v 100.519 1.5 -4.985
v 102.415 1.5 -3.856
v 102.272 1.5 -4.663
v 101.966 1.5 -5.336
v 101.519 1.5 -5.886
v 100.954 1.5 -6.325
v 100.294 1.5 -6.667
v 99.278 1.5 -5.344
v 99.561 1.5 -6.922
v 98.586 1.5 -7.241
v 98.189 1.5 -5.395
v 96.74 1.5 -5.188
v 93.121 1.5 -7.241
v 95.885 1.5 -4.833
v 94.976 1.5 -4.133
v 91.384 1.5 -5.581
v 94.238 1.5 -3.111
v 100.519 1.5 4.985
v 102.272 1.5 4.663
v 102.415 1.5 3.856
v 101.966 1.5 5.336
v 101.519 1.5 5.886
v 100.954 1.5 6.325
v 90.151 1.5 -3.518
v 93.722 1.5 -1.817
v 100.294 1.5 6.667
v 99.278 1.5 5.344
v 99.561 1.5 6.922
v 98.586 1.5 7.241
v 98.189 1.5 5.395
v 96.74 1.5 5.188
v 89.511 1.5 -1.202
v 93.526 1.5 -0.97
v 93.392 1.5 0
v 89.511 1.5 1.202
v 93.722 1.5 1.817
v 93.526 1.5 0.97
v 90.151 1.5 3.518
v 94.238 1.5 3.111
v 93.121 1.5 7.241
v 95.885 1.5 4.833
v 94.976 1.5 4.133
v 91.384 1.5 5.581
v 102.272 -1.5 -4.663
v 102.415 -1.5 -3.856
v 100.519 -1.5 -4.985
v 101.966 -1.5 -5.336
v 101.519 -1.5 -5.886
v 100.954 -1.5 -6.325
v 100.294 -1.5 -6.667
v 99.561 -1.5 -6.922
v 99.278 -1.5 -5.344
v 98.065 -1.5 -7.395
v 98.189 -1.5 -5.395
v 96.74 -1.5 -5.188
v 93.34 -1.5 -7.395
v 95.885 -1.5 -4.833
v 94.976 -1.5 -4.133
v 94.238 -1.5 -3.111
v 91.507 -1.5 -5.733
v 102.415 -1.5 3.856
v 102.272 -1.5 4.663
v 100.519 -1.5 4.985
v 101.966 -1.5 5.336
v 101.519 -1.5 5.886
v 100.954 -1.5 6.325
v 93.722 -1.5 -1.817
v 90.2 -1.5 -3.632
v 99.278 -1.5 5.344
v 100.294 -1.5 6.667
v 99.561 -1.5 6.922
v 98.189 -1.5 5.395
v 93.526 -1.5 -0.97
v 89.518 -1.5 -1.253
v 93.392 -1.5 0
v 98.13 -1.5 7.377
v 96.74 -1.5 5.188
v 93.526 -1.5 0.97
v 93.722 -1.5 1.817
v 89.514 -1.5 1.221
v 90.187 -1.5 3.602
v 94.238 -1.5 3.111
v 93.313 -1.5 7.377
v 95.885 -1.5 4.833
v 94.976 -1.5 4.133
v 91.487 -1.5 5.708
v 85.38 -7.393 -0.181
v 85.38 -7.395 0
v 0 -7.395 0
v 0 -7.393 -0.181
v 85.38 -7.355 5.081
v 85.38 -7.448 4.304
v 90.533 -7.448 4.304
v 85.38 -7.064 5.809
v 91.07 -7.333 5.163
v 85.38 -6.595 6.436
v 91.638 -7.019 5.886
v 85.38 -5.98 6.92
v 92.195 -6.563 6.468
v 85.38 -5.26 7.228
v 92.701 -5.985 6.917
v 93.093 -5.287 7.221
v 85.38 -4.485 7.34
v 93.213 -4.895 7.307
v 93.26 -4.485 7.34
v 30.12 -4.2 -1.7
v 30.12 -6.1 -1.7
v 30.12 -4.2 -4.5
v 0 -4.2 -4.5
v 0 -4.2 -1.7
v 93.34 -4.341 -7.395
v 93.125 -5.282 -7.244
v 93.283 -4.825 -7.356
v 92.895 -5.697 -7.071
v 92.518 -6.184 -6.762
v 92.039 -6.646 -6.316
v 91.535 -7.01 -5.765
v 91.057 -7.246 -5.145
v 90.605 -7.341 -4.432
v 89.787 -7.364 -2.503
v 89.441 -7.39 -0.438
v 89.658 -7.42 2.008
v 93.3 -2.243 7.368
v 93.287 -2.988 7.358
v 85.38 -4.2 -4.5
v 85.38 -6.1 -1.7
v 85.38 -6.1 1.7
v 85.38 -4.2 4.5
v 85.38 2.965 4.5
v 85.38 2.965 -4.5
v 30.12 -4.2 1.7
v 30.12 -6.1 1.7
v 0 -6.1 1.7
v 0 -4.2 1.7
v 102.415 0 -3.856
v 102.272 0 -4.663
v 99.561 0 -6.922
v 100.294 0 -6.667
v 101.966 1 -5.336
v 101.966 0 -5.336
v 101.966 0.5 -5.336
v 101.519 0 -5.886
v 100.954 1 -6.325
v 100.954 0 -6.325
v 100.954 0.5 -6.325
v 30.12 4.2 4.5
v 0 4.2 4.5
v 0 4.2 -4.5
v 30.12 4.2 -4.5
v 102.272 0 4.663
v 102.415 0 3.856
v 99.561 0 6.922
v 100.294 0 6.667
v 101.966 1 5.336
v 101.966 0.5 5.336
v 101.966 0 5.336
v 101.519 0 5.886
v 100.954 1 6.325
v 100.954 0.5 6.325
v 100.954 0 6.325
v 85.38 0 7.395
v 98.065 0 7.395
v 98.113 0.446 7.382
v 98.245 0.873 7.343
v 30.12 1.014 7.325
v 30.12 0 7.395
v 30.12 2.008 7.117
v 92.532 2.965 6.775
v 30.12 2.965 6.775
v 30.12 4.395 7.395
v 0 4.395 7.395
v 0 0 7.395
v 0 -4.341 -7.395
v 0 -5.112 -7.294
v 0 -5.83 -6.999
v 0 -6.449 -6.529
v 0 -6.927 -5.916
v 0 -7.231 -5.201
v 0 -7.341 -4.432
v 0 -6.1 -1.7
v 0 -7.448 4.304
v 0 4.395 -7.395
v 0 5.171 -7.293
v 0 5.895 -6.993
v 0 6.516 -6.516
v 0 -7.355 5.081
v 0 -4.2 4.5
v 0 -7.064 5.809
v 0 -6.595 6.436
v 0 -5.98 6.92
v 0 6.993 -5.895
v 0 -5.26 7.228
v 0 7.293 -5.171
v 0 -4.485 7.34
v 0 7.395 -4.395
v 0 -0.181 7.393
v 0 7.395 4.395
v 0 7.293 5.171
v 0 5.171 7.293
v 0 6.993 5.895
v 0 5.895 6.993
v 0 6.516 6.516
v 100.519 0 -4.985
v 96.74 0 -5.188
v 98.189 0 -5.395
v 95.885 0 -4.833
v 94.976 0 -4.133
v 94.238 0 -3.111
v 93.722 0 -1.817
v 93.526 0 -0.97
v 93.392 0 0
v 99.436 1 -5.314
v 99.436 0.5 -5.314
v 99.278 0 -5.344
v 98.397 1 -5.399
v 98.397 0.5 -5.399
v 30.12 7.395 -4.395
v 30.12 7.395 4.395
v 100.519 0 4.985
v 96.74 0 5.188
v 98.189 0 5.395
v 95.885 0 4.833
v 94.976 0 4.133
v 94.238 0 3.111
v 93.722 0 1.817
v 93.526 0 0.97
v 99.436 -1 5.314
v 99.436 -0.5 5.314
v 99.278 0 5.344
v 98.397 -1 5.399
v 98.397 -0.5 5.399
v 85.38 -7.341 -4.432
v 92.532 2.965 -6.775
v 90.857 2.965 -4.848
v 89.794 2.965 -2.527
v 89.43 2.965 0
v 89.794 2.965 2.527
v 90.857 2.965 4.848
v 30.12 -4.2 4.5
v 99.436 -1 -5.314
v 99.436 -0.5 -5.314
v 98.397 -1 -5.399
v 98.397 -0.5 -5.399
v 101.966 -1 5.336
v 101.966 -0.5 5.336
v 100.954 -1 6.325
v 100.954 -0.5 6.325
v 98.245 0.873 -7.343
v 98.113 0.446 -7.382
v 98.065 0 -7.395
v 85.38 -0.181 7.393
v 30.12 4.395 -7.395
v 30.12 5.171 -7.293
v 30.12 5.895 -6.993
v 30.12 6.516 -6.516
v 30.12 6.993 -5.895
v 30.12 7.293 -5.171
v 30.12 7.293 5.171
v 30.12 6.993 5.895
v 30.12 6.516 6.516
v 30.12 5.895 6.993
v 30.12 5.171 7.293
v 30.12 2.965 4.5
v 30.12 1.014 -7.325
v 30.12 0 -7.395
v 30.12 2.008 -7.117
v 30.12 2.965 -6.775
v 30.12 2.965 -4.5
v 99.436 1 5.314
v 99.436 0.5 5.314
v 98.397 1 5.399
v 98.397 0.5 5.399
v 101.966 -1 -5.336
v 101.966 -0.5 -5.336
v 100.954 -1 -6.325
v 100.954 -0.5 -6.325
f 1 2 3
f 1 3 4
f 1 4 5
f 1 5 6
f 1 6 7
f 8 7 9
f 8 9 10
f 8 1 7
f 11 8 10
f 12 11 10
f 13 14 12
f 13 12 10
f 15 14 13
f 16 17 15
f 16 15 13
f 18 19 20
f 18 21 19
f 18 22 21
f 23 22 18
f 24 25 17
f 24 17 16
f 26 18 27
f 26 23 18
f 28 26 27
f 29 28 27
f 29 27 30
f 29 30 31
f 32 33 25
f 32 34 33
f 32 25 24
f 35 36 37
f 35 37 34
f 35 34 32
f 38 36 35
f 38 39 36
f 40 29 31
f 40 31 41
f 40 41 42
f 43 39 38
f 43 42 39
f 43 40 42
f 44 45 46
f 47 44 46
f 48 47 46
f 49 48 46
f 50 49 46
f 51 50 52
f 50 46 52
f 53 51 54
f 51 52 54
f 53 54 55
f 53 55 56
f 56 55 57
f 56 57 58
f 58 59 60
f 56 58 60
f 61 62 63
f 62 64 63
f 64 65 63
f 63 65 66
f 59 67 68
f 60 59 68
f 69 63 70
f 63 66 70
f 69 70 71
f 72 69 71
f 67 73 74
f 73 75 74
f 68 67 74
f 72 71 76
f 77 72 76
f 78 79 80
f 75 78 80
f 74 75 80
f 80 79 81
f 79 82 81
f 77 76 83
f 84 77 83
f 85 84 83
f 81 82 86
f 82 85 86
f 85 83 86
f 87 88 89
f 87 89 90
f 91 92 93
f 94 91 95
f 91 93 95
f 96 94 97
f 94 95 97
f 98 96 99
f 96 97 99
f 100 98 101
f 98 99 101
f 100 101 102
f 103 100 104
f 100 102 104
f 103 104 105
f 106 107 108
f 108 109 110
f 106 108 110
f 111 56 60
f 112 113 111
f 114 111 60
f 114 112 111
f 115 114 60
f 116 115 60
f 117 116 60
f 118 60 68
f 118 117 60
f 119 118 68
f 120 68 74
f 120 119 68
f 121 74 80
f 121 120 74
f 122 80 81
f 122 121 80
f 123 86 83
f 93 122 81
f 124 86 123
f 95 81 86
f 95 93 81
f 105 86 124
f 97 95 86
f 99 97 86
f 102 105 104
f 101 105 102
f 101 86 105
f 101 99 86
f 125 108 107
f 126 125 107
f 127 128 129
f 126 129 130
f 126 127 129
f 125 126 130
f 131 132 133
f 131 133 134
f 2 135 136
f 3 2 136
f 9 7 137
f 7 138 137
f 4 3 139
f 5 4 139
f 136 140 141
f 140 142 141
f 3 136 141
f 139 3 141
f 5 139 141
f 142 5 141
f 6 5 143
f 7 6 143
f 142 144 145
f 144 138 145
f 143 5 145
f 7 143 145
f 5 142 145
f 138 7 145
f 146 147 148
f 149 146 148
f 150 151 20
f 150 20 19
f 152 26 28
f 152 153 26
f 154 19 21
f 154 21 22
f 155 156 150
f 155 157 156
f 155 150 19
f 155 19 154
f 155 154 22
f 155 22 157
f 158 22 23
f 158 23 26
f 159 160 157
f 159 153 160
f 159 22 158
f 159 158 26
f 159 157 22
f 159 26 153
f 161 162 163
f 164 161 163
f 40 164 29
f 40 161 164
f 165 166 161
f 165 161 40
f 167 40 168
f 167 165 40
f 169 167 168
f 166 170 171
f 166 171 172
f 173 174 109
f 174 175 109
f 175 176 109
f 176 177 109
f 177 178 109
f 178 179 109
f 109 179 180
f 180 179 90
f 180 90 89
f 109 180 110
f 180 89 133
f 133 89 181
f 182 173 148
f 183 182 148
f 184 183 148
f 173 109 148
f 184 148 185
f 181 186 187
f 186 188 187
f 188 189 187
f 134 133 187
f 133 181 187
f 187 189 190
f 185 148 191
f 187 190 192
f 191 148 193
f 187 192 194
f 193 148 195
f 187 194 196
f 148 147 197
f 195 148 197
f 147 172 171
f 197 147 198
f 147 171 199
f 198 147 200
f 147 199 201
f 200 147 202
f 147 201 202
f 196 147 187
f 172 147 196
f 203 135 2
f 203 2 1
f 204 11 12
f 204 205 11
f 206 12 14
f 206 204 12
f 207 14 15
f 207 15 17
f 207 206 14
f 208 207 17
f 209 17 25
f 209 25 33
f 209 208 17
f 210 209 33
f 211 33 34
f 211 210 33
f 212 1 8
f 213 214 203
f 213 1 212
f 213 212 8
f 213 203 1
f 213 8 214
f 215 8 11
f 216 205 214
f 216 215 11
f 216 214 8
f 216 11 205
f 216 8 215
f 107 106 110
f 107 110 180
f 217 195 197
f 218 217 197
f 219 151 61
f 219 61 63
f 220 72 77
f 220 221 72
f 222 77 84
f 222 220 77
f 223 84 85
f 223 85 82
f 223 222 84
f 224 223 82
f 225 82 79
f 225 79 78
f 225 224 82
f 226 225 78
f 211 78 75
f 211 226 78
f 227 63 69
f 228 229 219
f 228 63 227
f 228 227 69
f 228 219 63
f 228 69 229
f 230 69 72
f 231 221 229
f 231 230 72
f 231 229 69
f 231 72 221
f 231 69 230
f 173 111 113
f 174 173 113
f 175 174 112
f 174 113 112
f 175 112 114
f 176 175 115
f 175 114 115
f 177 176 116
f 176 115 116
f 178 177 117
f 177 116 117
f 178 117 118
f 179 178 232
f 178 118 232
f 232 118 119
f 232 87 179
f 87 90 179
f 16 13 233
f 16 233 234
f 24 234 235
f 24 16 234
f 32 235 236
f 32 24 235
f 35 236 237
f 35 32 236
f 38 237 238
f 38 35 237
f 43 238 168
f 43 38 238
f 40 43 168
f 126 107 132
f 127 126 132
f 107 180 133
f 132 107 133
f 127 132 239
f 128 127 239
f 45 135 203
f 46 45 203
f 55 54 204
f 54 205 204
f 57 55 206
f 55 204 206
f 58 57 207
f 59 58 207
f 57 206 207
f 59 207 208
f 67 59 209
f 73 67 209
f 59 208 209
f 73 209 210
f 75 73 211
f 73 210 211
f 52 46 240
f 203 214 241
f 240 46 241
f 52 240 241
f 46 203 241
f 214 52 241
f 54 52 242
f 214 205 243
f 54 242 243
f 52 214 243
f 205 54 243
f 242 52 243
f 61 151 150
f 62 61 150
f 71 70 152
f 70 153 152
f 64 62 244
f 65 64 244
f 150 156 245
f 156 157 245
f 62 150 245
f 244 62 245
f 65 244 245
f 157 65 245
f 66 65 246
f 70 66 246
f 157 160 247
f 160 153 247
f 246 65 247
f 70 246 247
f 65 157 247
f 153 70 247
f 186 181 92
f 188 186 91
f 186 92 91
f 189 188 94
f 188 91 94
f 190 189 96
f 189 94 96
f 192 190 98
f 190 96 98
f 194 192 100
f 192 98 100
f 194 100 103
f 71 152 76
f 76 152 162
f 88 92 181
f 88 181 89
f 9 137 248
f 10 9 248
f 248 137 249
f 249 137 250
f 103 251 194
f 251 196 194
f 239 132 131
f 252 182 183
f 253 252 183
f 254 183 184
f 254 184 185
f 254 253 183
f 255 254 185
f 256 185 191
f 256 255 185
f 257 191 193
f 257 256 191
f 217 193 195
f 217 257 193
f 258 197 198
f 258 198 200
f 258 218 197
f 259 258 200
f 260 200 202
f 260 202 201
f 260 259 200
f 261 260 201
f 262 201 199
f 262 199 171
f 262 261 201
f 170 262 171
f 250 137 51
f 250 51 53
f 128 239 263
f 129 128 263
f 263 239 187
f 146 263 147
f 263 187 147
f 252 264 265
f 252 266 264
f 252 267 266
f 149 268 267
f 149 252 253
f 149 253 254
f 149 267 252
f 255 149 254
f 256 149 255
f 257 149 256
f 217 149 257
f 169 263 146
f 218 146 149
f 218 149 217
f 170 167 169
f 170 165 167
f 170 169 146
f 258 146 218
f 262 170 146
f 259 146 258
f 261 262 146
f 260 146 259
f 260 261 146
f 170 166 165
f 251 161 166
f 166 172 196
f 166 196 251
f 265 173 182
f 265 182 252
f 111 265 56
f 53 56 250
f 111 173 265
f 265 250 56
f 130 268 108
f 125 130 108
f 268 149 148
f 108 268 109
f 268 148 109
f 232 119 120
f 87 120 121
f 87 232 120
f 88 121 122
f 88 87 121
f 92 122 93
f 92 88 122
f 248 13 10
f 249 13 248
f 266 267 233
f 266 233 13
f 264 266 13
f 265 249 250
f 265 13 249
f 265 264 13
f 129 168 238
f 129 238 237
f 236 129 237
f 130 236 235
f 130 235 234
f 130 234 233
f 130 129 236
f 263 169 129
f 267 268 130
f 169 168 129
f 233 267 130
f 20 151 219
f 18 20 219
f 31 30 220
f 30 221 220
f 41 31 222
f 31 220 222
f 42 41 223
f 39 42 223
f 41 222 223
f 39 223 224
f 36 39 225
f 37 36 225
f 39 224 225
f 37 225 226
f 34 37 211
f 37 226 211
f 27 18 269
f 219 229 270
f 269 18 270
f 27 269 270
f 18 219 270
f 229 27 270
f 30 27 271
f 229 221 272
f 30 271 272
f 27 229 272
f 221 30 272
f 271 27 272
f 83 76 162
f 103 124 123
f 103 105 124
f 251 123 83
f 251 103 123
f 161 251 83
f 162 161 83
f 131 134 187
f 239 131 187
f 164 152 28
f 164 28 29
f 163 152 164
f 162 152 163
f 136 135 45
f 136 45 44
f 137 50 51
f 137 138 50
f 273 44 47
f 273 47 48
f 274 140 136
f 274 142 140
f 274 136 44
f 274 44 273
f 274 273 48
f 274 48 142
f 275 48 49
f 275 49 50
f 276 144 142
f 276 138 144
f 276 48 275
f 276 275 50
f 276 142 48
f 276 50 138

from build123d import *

# Parameters (mm, degrees)
F1_DEPTH = 30.12
F3_DEPTH = 55.26
F6_DEPTH = 7.5
F8_DEPTH = 1.5
F9_DEPTH = 13.7
F10_R    = 3


with BuildPart() as f1:
    # F0 (on Right) → F1 (new body)
    with BuildSketch(Plane.YZ):
        with BuildLine():
            ThreePointArc((0, -7.395), (5.2290546469, -5.2290546469), (7.395, 0))
            ThreePointArc((7.395, 0), (5.2290546469, 5.2290546469), (0, 7.395))
            Line((0, 7.395), (-0.1808295417, 7.3927887618))
            ThreePointArc((-0.1808295417, 7.3927887618), (-5.2926014143, 5.1647260595), (-7.395, 0))
            Line((-7.395, 0), (-7.3927887618, -0.1808295417))
            ThreePointArc((-7.3927887618, -0.1808295417), (-5.1647260595, -5.2926014143), (0, -7.395))
        make_face()
        Polygon((-4.2, 1.7), (-4.2, 4.5), (4.2, 4.5), (4.2, -4.5), (-4.2, -4.5), (-4.2, -1.7), (-6.1, -1.7), (-6.1, 1.7), align=None, mode=Mode.SUBTRACT)
        with BuildLine():
            Line((-7.3045717093, -7.395), (0, -7.395))
            ThreePointArc((0, -7.395), (-5.1647260595, -5.2926014143), (-7.3927887618, -0.1808295417))
            Line((-7.3927887618, -0.1808295417), (-7.3045717093, -7.395))
        make_face()
        with BuildLine():
            ThreePointArc((-7.395, 0), (-5.2926014143, 5.1647260595), (-0.1808295417, 7.3927887618))
            Line((-0.1808295417, 7.3927887618), (-7.4843091518, 7.3034796101))
            Line((-7.4843091518, 7.3034796101), (-7.395, 0))
        make_face()
        with BuildLine():
            Line((7.395, -7.395), (7.395, 0))
            ThreePointArc((7.395, 0), (5.2290546469, -5.2290546469), (0, -7.395))
            Line((0, -7.395), (7.395, -7.395))
        make_face()
        with BuildLine():
            ThreePointArc((0, 7.395), (5.2290546469, 5.2290546469), (7.395, 0))
            Line((7.395, 0), (7.395, 7.395))
            Line((7.395, 7.395), (0, 7.395))
        make_face()
    extrude(amount=F1_DEPTH)

    # F2 (on face) → F3 (join)
    with BuildSketch(Plane.YZ.offset(30.12)):
        with BuildLine():
            ThreePointArc((-7.395, 0), (-5.2926014143, 5.1647260595), (-0.1808295417, 7.3927887618))
            Line((-0.1808295417, 7.3927887618), (-7.4843091518, 7.3034796101))
            Line((-7.4843091518, 7.3034796101), (-7.395, 0))
        make_face()
        with BuildLine():
            Line((2.9646117869, 4.5), (2.9646117869, 6.7747399916))
            ThreePointArc((2.9646117869, 6.7747399916), (1.5144013277, 7.2382742155), (0, 7.395))
            Line((0, 7.395), (-0.1808295417, 7.3927887618))
            ThreePointArc((-0.1808295417, 7.3927887618), (-5.2926014143, 5.1647260595), (-7.395, 0))
            Line((-7.395, 0), (-7.3927887618, -0.1808295417))
            ThreePointArc((-7.3927887618, -0.1808295417), (-5.1647260595, -5.2926014143), (0, -7.395))
            ThreePointArc((0, -7.395), (1.5144013277, -7.2382742155), (2.9646117869, -6.7747399916))
            Line((2.9646117869, -6.7747399916), (2.9646117869, -4.5))
            Line((2.9646117869, -4.5), (-4.2, -4.5))
            Line((-4.2, -4.5), (-6.1, -1.7))
            Line((-6.1, -1.7), (-6.1, 1.7))
            Line((-6.1, 1.7), (-4.2, 4.5))
            Line((-4.2, 4.5), (2.9646117869, 4.5))
        make_face()
        with BuildLine():
            Line((-7.3045717093, -7.395), (0, -7.395))
            ThreePointArc((0, -7.395), (-5.1647260595, -5.2926014143), (-7.3927887618, -0.1808295417))
            Line((-7.3927887618, -0.1808295417), (-7.3045717093, -7.395))
        make_face()
    extrude(amount=F3_DEPTH)

    # F5 (on Front) → F6 (join, symmetric)
    with BuildSketch(Plane.XZ):
        with BuildLine():
            Line((93.34, 7.395), (85.38, 7.395))
            Line((85.38, 7.395), (85.38, -7.395))
            Line((85.38, -7.395), (93.34, -7.395))
            ThreePointArc((93.34, -7.395), (89.43, 0), (93.34, 7.395))
        make_face()
    extrude(amount=F6_DEPTH, both=True)

    # F7 (on Front) → F8 (join, symmetric)
    with BuildSketch(Plane.XZ):
        with BuildLine():
            add(Edge.make_bspline(
                [(99.5611976313, -6.9222719045), (97.6347457755, -7.5906937073), (93.8964104218, -8.4654582573), (90.4010751726, -7.8833055428), (88.7074694037, -7.395)],
                knots=[0, 0, 0, 0, 0.5144212355, 1, 1, 1, 1], degree=3))
            add(Edge.make_bspline(
                [(99.5611976313, -6.9222719045), (97.217178841, -7.58868722), (94.1584374095, -7.2106656851), (93.34, -7.395)],
                knots=[3.9877929831, 3.9877929831, 3.9877929831, 3.9877929831, 9.8433615853, 9.8433615853, 9.8433615853, 9.8433615853], degree=3))
            Line((93.34, -7.395), (88.7074694037, -7.395))
        make_face()
        with BuildLine():
            add(Edge.make_bspline(
                [(99.5611976313, -6.9222719045), (97.217178841, -7.58868722), (94.1584374095, -7.2106656851), (93.34, -7.395)],
                knots=[3.9877929831, 3.9877929831, 3.9877929831, 3.9877929831, 9.8433615853, 9.8433615853, 9.8433615853, 9.8433615853], degree=3))
            add(Edge.make_bspline(
                [(102.4147021825, -3.8559928472), (102.3072303482, -5.6141000369), (101.0852953963, -6.488963905), (99.5611976313, -6.9222719045)],
                knots=[0.1804604412, 0.1804604412, 0.1804604412, 0.1804604412, 3.9877929831, 3.9877929831, 3.9877929831, 3.9877929831], degree=3))
            add(Edge.make_bspline(
                [(102.4147021825, -3.8559928472), (101.0774964274, -4.8978899586), (99.4699665658, -5.3518592672), (98.3198470269, -5.449623214), (93.894019065, -5.2308255551), (93.3923863769, 0)],
                knots=[0.0006270435, 0.0006270435, 0.0006270435, 0.0006270435, 0.3281259648, 0.5118184212, 1, 1, 1, 1], degree=3))
            add(Edge.make_bspline(
                [(102.4147021825, 3.8559928472), (101.0774964274, 4.8978899586), (99.4699665658, 5.3518592672), (98.3198470269, 5.449623214), (93.894019065, 5.2308255551), (93.3923863769, 0)],
                knots=[0.0006270435, 0.0006270435, 0.0006270435, 0.0006270435, 0.3281259648, 0.5118184212, 1, 1, 1, 1], degree=3))
            add(Edge.make_bspline(
                [(102.4147021825, 3.8559928472), (102.3072303482, 5.6141000369), (101.0852953963, 6.488963905), (99.5611976313, 6.9222719045)],
                knots=[0.1804604412, 0.1804604412, 0.1804604412, 0.1804604412, 3.9877929831, 3.9877929831, 3.9877929831, 3.9877929831], degree=3))
            add(Edge.make_bspline(
                [(99.5611976313, 6.9222719045), (97.217178841, 7.58868722), (94.1584374095, 7.2106656851), (93.34, 7.395)],
                knots=[3.9877929831, 3.9877929831, 3.9877929831, 3.9877929831, 9.8433615853, 9.8433615853, 9.8433615853, 9.8433615853], degree=3))
            ThreePointArc((93.34, 7.395), (89.43, 0), (93.34, -7.395))
        make_face()
        with BuildLine():
            Line((88.7074694037, 7.395), (93.34, 7.395))
            add(Edge.make_bspline(
                [(99.5611976313, 6.9222719045), (97.217178841, 7.58868722), (94.1584374095, 7.2106656851), (93.34, 7.395)],
                knots=[3.9877929831, 3.9877929831, 3.9877929831, 3.9877929831, 9.8433615853, 9.8433615853, 9.8433615853, 9.8433615853], degree=3))
            add(Edge.make_bspline(
                [(99.5611976313, 6.9222719045), (97.6347457755, 7.5906937073), (93.8964104218, 8.4654582573), (90.4010751726, 7.8833055428), (88.7074694037, 7.395)],
                knots=[0, 0, 0, 0, 0.5144212355, 1, 1, 1, 1], degree=3))
        make_face()
    extrude(amount=F8_DEPTH, both=True)

    # F4 (on face) → F9 (cut)
    with BuildSketch(Plane.YZ.offset(85.38)):
        with BuildLine():
            Line((-8.1289913505, 8.4002688527), (-8.1289913505, -8.4002688527))
            Line((-8.1289913505, -8.4002688527), (2.9646117869, -8.4002688527))
            Line((2.9646117869, -8.4002688527), (2.9646117869, -6.7747399916))
            ThreePointArc((2.9646117869, -6.7747399916), (1.5144013277, -7.2382742155), (0, -7.395))
            Line((0, -7.395), (-7.3045717093, -7.395))
            Line((-7.3045717093, -7.395), (-7.4843091518, 7.3034796101))
            Line((-7.4843091518, 7.3034796101), (0, 7.395))
            ThreePointArc((0, 7.395), (1.5144013277, 7.2382742155), (2.9646117869, 6.7747399916))
            Line((2.9646117869, 6.7747399916), (2.9646117869, 8.4002688527))
            Line((2.9646117869, 8.4002688527), (-8.1289913505, 8.4002688527))
        make_face()
        Polygon((2.9646117869, -6.7747399916), (2.9646117869, -8.4002688527), (8.1289913505, -8.4002688527), (8.1289913505, 8.4002688527), (2.9646117869, 8.4002688527), (2.9646117869, 6.7747399916), (2.9646117869, 4.5), (2.9646117869, -4.5), align=None)
    extrude(amount=F9_DEPTH, mode=Mode.SUBTRACT)

    # F10
    f10_edges = [f1.edges().sort_by_distance(p)[0] for p in [
        (46.67, -7.304572, -7.395),
        (15.06, 7.395, 7.395),
        (15.06, 7.395, -7.395),
        (46.60411, -7.484309, 7.30348),
    ]]
    fillet(f10_edges, radius=F10_R)


solid = f1.part
